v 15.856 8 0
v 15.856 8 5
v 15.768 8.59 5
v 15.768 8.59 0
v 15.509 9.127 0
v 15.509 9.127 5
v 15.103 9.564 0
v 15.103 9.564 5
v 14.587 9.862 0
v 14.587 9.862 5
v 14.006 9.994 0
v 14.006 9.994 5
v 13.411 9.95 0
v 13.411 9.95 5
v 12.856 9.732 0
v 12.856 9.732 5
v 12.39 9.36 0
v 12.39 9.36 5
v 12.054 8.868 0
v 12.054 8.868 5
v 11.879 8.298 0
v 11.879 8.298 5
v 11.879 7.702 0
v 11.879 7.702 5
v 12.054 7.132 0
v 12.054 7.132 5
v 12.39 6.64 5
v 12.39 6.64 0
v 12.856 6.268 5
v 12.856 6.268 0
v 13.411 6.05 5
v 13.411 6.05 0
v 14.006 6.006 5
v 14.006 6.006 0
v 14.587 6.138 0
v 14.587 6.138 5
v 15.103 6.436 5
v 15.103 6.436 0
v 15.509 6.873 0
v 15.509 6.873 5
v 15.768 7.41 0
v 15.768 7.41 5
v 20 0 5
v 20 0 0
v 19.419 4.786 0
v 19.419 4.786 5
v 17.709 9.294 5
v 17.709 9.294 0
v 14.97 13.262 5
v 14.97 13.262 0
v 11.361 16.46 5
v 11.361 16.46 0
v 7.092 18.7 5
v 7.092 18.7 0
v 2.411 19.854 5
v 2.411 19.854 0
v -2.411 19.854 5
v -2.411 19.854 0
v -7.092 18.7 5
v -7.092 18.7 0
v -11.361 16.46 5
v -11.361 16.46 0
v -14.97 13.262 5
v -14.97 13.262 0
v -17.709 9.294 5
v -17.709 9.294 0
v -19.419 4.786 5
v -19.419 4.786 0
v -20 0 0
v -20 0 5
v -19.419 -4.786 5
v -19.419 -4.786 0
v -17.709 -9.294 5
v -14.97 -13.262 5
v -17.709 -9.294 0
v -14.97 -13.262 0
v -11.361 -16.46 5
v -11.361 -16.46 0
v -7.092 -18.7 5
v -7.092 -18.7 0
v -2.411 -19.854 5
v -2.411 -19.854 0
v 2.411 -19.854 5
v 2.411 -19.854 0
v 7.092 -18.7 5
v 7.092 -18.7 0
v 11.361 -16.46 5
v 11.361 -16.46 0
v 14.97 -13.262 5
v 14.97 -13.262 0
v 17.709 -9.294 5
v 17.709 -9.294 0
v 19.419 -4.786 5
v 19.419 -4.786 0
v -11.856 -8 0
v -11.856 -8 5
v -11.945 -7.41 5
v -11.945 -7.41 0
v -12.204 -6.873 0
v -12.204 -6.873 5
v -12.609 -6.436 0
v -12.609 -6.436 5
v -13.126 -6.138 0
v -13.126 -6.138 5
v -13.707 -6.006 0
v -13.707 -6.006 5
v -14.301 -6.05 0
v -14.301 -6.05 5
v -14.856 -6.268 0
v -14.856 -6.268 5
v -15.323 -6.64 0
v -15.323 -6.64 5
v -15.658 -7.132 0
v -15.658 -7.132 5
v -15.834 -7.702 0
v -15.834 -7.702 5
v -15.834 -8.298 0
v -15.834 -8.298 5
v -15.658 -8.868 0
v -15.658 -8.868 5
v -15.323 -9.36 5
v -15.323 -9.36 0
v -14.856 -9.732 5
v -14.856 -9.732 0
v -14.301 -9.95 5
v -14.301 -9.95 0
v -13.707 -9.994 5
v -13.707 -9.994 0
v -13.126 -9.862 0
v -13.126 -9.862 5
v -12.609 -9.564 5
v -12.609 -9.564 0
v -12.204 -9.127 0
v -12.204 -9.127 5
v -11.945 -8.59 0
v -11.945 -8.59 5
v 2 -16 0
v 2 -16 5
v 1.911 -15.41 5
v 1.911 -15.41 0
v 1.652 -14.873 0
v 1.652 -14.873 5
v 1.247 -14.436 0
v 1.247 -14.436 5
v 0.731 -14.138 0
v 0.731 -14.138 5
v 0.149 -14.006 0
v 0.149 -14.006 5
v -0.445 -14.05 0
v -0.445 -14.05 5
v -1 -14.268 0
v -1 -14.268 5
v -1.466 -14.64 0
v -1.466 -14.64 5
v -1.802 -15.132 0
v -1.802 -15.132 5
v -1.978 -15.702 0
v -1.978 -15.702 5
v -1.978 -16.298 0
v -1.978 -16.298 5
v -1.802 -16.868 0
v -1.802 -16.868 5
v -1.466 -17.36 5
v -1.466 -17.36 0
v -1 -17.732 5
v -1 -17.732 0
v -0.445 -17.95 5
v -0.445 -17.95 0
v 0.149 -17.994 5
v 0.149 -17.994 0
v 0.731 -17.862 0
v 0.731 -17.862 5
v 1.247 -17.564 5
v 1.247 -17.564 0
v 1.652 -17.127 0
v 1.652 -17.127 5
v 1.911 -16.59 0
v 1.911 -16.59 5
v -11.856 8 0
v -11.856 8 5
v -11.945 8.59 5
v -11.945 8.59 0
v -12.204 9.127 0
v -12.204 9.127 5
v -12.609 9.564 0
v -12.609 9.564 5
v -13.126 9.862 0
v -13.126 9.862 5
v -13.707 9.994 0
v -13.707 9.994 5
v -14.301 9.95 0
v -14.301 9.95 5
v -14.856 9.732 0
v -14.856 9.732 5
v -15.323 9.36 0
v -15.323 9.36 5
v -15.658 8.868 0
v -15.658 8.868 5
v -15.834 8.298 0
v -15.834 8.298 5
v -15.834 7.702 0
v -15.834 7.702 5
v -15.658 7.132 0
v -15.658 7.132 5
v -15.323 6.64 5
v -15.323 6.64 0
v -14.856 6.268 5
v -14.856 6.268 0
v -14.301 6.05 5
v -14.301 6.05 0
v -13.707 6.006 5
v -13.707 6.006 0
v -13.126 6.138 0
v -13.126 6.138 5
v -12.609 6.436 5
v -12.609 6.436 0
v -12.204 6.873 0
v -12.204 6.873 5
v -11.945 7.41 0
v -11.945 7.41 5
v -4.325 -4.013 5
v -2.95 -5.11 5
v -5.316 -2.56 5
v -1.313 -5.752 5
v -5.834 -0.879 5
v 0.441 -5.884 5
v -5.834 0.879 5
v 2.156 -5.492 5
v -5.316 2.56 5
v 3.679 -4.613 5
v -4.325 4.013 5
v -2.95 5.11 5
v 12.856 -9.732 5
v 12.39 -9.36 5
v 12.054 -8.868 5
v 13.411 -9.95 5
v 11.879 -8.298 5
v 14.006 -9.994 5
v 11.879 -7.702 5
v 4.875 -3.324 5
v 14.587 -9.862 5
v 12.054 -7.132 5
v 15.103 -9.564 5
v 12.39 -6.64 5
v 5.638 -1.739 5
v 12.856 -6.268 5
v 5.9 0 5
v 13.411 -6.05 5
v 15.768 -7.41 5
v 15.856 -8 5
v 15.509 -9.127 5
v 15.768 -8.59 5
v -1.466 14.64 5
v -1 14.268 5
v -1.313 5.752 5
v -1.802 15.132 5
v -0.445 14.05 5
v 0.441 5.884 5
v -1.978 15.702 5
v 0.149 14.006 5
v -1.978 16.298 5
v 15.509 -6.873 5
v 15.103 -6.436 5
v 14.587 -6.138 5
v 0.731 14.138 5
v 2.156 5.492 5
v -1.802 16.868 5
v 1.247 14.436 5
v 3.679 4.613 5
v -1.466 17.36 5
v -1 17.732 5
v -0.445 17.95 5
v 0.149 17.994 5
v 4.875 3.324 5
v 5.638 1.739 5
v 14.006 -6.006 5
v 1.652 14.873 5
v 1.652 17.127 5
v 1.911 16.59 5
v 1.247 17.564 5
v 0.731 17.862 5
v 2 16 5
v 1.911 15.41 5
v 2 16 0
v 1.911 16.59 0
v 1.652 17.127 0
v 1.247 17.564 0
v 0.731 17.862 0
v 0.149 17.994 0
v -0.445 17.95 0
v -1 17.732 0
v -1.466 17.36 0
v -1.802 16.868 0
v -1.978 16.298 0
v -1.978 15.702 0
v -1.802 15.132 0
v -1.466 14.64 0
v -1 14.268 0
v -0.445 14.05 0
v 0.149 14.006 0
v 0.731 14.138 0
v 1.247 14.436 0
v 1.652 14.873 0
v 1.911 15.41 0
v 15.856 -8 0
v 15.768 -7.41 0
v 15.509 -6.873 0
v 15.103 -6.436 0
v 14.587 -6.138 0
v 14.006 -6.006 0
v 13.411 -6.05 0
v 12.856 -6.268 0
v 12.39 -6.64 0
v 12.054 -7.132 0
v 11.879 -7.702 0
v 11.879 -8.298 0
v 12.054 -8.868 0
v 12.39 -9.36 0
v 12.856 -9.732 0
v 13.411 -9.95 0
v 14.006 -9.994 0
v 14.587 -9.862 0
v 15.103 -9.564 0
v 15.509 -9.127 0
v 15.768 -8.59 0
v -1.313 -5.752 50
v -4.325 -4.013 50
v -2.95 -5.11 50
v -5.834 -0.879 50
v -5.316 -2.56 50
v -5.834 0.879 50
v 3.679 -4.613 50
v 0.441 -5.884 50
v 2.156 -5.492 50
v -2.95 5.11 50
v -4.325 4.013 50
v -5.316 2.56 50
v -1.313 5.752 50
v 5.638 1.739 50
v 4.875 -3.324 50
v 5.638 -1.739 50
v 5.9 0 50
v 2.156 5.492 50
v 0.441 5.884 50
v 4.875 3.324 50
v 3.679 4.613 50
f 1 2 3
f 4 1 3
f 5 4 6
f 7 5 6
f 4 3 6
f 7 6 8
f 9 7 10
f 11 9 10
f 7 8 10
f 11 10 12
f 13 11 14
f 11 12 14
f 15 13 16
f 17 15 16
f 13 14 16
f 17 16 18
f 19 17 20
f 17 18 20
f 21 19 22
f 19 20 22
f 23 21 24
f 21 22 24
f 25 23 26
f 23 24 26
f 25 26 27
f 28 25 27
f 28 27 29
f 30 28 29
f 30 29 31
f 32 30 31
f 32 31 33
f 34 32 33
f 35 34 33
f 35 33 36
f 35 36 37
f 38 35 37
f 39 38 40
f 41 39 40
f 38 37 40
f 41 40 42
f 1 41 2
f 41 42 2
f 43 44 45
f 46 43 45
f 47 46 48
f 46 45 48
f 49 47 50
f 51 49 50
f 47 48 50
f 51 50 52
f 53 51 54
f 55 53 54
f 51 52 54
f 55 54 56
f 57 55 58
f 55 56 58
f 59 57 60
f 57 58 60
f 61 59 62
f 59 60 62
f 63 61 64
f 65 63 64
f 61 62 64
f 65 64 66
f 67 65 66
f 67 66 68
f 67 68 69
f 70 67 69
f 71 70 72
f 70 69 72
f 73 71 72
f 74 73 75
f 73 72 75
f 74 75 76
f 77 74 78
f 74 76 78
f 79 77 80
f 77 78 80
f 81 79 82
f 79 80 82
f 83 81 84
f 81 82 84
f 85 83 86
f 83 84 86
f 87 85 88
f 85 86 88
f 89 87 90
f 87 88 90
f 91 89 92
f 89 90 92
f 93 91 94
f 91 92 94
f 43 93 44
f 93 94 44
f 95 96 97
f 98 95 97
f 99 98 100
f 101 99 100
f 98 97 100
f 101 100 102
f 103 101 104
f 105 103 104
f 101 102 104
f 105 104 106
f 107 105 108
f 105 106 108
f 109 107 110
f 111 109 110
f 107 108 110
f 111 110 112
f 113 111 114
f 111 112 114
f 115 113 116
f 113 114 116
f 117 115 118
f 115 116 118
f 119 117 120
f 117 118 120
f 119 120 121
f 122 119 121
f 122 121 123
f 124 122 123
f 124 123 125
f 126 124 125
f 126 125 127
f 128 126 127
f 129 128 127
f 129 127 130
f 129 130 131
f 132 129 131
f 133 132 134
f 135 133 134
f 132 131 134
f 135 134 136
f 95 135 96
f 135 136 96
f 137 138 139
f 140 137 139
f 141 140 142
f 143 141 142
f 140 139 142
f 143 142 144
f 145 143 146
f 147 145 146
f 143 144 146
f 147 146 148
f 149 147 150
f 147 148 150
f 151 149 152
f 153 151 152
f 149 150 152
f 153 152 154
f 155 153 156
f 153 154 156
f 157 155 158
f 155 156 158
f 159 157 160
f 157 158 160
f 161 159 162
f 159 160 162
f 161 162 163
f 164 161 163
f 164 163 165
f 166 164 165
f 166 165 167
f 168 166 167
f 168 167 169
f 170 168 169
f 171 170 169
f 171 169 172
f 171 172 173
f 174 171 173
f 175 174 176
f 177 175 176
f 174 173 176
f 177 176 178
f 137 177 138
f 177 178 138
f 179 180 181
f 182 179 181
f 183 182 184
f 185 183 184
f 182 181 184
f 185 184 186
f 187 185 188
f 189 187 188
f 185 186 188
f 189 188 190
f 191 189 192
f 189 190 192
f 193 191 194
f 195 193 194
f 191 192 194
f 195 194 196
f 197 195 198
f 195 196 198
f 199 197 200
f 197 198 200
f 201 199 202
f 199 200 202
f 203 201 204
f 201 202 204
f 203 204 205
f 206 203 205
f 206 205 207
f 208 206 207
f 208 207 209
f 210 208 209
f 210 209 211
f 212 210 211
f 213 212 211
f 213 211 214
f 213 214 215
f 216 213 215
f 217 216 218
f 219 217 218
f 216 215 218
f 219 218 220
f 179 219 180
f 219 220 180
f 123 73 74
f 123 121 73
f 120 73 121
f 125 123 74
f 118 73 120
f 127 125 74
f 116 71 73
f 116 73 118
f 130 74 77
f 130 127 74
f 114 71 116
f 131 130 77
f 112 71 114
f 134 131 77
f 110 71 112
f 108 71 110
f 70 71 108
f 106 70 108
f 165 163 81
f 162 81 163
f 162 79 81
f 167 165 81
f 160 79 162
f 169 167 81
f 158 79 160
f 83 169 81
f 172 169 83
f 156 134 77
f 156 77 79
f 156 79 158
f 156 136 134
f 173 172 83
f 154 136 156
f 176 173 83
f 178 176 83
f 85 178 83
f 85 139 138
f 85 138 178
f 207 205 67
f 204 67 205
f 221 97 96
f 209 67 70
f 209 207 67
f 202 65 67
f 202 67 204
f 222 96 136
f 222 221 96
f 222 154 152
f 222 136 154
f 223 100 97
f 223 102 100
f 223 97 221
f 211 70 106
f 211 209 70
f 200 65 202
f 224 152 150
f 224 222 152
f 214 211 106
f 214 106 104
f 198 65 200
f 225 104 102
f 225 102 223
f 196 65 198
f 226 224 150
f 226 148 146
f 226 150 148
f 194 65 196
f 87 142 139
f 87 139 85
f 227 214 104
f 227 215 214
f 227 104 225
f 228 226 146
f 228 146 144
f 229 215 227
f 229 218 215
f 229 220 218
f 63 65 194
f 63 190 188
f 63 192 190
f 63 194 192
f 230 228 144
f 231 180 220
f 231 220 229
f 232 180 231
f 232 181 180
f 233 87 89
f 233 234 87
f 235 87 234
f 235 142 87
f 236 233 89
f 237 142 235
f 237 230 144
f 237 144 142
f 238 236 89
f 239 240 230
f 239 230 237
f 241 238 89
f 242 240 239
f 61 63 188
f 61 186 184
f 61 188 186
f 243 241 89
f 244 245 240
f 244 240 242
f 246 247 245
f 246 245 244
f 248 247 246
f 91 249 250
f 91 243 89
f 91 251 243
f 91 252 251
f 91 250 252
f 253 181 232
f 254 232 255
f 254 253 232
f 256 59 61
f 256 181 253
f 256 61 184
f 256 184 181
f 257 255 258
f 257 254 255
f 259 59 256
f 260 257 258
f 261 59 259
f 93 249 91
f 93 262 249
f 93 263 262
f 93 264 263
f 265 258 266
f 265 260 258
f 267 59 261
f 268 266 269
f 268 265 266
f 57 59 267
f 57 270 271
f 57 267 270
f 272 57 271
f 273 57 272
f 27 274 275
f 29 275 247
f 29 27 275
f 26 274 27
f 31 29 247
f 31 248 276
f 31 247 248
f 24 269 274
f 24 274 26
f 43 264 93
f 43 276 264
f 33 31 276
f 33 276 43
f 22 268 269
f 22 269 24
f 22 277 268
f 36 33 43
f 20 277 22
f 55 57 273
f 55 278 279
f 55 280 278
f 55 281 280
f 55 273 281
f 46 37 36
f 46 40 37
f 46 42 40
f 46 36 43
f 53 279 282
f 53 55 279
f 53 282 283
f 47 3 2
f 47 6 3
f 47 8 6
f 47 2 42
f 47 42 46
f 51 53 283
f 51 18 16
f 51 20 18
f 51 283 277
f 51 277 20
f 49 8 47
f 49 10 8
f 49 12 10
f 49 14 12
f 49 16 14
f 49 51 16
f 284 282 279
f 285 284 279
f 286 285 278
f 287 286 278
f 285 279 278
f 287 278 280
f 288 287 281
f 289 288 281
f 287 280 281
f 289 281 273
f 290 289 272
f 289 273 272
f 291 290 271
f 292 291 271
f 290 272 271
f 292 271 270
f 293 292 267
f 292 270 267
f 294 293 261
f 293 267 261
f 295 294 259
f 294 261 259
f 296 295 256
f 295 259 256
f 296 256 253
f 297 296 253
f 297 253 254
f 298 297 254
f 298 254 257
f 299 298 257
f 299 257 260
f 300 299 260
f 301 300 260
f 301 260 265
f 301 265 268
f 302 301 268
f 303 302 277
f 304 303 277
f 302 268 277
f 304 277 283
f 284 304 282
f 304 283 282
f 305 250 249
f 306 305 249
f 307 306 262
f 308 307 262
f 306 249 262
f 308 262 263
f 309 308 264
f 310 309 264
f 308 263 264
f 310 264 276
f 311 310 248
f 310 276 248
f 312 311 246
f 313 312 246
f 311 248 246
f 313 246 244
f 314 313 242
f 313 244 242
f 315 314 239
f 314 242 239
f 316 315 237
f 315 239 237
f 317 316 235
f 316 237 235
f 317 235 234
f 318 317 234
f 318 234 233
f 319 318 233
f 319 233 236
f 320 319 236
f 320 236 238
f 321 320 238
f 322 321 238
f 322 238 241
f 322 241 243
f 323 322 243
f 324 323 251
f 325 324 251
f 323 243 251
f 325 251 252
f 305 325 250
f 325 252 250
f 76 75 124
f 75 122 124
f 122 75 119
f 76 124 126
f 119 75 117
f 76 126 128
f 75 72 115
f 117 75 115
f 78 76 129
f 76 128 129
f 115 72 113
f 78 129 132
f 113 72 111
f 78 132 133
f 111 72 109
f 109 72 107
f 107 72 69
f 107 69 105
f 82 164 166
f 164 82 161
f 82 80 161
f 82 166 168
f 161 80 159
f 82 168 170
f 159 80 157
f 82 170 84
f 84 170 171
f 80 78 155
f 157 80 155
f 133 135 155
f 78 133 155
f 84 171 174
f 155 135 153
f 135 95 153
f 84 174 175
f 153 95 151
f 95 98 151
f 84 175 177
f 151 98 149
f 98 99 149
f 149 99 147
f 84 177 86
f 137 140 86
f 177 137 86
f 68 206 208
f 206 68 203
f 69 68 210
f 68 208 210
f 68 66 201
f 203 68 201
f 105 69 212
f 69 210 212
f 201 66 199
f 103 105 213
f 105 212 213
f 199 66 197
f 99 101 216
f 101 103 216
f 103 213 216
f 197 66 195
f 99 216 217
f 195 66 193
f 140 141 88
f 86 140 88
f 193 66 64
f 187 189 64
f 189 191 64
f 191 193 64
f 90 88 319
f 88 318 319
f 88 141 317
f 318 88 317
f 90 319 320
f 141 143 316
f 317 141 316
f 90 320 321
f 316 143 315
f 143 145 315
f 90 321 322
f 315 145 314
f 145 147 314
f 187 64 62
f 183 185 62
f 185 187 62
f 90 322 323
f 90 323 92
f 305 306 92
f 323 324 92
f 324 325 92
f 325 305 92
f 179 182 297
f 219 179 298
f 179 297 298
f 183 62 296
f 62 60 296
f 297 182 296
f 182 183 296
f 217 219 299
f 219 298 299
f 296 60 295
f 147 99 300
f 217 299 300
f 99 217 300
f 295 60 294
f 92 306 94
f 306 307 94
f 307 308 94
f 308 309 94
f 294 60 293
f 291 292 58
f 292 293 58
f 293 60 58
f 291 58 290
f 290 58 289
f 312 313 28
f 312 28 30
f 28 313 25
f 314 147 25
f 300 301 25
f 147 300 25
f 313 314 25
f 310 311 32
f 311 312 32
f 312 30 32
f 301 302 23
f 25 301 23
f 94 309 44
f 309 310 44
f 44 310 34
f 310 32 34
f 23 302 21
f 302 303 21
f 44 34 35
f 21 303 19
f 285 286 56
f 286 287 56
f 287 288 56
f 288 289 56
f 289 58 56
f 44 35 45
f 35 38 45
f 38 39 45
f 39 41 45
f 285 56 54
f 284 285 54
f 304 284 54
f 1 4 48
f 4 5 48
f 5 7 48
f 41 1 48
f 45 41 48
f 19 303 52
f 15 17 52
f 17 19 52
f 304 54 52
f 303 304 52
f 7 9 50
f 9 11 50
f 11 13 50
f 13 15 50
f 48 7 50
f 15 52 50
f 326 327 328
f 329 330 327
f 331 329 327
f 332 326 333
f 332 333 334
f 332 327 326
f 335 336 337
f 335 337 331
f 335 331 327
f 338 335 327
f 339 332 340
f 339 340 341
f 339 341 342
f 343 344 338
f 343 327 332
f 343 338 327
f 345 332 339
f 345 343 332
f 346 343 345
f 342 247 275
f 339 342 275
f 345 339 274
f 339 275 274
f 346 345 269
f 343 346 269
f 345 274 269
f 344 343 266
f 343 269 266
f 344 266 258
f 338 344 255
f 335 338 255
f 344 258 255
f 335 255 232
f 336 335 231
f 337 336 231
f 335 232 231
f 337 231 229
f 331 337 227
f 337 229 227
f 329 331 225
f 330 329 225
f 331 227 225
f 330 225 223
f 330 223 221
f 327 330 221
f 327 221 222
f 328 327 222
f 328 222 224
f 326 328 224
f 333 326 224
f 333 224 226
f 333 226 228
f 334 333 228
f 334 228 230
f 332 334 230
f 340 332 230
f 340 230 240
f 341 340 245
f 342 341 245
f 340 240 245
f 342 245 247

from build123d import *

# Parameters (mm, degrees)
SKETCH1_R           = 20
BOSS_EXTRUDE1_DEPTH = 5
SKETCH2_R           = 5.9
BOSS_EXTRUDE2_DEPTH = 45
SKETCH3_R           = 2
CUT_EXTRUDE1_DEPTH  = 5


with BuildPart() as part:
    # Sketch1 → Boss-Extrude1 (new body)
    with BuildSketch(Plane.XY):
        Circle(SKETCH1_R)
    extrude(amount=BOSS_EXTRUDE1_DEPTH)

    # Sketch2 → Boss-Extrude2 (add)
    with BuildSketch(Plane.XY.offset(5)):
        Circle(SKETCH2_R)
    extrude(amount=BOSS_EXTRUDE2_DEPTH)

    # Sketch3 → Cut-Extrude1 (cut)
    with BuildSketch(Plane.XY.offset(5)):
        with Locations((0, 16)):
            Circle(SKETCH3_R)
        with Locations((13.856406461, 8)):
            Circle(SKETCH3_R)
        with Locations((13.856406461, -8)):
            Circle(SKETCH3_R)
        with Locations((0, -16)):
            Circle(SKETCH3_R)
        with Locations((-13.856406461, -8)):
            Circle(SKETCH3_R)
        with Locations((-13.856406461, 8)):
            Circle(SKETCH3_R)
    extrude(amount=-CUT_EXTRUDE1_DEPTH, mode=Mode.SUBTRACT)


solid = part.part
